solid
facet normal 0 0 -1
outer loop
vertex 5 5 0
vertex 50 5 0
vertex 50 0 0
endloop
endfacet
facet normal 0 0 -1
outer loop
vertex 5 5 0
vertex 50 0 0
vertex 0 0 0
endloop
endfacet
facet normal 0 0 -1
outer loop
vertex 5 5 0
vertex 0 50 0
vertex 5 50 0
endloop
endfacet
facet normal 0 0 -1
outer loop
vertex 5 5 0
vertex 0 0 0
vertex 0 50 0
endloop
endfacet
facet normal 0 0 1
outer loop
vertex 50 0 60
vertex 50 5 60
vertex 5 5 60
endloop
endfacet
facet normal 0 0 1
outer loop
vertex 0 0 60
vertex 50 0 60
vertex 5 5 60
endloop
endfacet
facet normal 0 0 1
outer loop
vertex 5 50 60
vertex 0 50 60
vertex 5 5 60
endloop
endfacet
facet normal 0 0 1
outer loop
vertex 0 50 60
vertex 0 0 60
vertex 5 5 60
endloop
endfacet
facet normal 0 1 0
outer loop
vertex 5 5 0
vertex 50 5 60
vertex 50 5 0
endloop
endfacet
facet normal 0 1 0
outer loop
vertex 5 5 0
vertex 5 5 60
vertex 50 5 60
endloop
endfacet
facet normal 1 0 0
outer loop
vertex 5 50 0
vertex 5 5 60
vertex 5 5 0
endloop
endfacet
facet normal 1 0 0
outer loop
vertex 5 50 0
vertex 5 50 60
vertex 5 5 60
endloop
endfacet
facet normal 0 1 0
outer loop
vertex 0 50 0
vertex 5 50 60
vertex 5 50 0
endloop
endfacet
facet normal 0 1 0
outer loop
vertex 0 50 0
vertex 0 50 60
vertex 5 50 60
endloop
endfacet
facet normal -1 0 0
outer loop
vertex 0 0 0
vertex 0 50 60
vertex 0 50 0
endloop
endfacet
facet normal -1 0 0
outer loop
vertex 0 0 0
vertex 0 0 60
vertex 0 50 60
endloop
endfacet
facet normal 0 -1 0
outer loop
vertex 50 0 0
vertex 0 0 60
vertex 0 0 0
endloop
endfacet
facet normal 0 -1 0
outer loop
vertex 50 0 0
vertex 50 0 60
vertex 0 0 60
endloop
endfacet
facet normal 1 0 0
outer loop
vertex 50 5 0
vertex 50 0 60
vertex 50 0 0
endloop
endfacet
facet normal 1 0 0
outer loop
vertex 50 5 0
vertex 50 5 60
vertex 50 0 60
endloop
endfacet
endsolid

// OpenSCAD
$fn = 32;

// ----------------------------------------------------------------------
// Structural section: angle 50 x 50 mm
// ----------------------------------------------------------------------

// --- parameters (mm) ---
sec_w = 50;               // leg width, X
sec_h = 50;               // leg height, Y
flange_t = 5;             // leg thickness
plate_t = 60;             // cut length, Z (extrusion height)

profile = [[0, 0], [50, 0], [50, 5], [5, 5], [5, 50], [0, 50]];  // primary outline, 6 points, counter clockwise

// --- the one profile operation ---
linear_extrude(height = plate_t) polygon(points = profile);
